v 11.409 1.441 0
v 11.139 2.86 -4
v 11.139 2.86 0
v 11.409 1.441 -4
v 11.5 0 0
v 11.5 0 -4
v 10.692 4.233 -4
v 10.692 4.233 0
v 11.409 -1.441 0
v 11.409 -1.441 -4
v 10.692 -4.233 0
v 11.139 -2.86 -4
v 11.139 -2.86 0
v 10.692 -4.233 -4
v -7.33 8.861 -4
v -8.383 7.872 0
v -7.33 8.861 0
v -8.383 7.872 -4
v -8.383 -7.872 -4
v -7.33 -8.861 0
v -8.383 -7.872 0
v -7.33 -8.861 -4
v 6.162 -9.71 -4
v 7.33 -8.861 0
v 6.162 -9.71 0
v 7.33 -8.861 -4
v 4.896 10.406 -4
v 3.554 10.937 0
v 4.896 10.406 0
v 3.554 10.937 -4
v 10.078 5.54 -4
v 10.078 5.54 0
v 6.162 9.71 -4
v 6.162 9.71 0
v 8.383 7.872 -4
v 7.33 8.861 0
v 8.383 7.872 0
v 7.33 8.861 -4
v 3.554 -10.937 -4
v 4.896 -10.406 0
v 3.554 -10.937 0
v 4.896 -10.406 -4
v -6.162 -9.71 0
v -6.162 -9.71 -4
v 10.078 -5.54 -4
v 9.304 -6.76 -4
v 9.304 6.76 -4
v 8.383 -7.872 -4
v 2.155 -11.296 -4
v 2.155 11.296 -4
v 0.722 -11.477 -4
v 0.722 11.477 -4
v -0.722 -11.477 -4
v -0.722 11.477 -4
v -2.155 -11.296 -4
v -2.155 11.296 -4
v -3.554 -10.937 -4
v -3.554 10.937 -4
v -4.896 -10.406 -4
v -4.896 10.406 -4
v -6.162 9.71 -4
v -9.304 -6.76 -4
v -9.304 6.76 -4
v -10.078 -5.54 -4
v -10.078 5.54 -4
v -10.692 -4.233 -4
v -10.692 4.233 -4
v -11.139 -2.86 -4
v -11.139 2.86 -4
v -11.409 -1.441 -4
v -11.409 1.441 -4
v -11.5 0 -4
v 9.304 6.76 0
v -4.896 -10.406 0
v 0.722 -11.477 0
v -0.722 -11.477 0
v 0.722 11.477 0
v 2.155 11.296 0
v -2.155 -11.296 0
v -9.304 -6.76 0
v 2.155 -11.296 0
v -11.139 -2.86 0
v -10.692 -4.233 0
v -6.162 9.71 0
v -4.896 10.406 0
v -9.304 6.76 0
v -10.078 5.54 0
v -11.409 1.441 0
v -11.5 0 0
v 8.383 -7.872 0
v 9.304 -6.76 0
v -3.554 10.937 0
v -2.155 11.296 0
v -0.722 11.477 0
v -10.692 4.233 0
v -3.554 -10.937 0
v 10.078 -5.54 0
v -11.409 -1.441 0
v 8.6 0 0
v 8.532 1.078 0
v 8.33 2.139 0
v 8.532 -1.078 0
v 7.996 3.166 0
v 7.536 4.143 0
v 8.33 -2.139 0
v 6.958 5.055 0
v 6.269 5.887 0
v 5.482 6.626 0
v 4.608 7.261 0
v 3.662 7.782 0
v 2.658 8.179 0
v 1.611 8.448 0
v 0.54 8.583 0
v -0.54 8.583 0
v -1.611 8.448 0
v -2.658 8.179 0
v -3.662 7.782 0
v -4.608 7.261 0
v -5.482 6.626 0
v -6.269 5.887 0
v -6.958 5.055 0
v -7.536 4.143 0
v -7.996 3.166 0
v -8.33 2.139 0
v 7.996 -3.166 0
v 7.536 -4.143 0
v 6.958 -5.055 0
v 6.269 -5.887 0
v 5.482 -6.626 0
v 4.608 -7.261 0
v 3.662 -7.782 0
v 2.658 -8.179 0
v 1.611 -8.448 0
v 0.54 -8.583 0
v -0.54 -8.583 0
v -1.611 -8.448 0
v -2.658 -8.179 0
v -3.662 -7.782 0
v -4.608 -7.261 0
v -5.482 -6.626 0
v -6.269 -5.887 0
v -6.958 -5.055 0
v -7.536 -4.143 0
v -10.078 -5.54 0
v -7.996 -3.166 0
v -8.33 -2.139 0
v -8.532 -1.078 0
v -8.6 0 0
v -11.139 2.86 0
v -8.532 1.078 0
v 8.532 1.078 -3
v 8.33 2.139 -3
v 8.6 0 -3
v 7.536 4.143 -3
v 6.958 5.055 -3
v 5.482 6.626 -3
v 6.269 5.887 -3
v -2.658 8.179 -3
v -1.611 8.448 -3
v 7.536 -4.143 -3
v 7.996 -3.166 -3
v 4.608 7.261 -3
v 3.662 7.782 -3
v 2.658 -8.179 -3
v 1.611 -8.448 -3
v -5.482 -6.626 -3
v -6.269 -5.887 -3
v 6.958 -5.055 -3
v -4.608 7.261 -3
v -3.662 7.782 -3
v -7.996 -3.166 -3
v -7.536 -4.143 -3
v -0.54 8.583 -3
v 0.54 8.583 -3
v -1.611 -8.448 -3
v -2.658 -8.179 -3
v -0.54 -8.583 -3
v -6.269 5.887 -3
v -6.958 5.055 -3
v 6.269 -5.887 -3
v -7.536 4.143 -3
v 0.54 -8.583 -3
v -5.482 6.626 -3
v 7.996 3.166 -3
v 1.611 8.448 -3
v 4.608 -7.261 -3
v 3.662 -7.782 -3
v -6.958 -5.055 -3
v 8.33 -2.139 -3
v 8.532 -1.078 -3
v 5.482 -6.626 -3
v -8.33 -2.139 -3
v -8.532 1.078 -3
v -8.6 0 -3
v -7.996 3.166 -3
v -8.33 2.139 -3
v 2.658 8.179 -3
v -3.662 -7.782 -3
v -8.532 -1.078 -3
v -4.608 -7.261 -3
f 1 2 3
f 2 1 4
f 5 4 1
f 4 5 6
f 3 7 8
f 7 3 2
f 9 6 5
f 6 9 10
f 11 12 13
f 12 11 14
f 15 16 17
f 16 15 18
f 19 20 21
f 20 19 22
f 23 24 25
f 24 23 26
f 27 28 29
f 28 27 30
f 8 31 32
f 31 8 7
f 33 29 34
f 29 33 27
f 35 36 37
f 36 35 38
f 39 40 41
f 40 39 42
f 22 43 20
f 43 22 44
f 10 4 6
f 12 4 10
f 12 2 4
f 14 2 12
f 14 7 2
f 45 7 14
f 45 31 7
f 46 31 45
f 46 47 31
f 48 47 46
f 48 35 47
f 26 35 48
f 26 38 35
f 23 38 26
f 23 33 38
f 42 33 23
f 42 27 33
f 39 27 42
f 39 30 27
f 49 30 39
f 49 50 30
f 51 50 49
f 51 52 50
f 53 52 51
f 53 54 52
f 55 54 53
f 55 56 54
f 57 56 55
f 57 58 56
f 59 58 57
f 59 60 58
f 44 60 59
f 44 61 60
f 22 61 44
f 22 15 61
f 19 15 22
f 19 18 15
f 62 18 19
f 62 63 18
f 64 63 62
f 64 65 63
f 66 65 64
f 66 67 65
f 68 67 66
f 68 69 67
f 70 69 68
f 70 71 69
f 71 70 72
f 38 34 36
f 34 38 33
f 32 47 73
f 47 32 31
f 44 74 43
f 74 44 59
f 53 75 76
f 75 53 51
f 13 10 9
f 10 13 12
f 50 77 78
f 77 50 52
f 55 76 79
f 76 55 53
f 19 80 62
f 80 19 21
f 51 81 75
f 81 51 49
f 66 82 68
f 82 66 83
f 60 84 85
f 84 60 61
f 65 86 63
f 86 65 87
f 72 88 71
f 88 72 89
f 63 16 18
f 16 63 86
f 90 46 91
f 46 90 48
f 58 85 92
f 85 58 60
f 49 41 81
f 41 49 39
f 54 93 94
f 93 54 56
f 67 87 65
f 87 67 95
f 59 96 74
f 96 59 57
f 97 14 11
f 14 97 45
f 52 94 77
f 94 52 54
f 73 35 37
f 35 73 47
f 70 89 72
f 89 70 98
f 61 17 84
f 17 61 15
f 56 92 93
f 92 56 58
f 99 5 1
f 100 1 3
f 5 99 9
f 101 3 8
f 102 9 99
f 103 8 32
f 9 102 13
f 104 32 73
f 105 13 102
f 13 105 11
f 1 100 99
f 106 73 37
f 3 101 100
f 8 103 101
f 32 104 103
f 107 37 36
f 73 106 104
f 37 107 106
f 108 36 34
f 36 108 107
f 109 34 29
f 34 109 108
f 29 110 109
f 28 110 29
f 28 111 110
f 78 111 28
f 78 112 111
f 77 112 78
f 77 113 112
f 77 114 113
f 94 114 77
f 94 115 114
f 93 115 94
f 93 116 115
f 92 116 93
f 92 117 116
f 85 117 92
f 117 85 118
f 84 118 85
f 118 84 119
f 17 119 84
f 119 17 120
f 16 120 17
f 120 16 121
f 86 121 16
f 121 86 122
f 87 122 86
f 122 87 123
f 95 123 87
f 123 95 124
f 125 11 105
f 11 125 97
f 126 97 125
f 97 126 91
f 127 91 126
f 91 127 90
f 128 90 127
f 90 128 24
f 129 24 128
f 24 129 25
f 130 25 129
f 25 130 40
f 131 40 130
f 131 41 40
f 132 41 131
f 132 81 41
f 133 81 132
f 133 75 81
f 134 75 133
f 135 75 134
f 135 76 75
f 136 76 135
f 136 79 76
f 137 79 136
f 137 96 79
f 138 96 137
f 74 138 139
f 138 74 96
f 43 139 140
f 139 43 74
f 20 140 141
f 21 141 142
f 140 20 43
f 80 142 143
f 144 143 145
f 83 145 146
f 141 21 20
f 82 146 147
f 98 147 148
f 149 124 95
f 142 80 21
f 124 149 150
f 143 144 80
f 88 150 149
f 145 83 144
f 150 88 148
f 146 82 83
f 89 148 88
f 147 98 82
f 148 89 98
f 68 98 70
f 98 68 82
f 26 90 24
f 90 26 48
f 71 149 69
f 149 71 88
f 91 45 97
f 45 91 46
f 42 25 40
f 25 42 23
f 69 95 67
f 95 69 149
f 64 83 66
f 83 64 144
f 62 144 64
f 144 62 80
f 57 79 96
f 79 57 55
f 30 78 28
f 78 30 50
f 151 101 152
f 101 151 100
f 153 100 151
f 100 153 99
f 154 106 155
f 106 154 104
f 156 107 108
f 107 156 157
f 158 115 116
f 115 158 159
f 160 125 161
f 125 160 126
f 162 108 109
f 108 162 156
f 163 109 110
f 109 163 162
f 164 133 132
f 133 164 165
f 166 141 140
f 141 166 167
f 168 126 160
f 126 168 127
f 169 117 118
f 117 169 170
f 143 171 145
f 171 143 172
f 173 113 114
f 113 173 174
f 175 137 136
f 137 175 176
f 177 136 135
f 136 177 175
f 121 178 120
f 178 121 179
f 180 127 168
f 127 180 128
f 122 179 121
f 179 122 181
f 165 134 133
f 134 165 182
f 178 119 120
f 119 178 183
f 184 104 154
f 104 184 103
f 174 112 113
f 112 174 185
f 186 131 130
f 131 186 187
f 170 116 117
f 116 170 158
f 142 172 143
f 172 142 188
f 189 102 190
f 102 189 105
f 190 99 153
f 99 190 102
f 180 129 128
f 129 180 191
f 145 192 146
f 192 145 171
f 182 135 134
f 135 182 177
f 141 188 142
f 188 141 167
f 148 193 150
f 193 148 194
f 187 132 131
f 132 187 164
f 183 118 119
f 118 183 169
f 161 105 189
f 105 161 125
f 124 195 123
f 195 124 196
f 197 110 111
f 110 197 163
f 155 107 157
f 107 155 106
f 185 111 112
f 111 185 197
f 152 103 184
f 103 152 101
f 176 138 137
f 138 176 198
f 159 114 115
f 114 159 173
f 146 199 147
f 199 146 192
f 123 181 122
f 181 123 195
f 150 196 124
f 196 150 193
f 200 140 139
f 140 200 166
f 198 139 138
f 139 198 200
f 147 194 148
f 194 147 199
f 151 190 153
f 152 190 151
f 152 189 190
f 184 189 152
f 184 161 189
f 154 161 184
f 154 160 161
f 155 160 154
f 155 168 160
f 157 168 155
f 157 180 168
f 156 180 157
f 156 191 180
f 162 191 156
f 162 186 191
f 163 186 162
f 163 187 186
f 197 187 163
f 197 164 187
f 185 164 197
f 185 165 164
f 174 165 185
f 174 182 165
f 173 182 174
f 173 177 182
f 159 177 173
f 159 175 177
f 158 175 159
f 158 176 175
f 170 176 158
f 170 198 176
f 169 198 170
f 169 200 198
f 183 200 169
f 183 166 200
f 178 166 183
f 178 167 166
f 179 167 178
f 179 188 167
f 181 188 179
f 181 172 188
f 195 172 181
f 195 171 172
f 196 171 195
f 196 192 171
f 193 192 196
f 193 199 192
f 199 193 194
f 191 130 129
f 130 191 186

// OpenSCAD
$fn = 50;


difference() {
	union() {
		translate(v = [0, 0, -4.0000000000]) {
			cylinder(h = 4, r = 11.5000000000);
		}
	}
	union() {
		#translate(v = [0, 0, -3.0000000000]) {
			cylinder(h = 3, r = 8.6000000000);
		}
	}
}
